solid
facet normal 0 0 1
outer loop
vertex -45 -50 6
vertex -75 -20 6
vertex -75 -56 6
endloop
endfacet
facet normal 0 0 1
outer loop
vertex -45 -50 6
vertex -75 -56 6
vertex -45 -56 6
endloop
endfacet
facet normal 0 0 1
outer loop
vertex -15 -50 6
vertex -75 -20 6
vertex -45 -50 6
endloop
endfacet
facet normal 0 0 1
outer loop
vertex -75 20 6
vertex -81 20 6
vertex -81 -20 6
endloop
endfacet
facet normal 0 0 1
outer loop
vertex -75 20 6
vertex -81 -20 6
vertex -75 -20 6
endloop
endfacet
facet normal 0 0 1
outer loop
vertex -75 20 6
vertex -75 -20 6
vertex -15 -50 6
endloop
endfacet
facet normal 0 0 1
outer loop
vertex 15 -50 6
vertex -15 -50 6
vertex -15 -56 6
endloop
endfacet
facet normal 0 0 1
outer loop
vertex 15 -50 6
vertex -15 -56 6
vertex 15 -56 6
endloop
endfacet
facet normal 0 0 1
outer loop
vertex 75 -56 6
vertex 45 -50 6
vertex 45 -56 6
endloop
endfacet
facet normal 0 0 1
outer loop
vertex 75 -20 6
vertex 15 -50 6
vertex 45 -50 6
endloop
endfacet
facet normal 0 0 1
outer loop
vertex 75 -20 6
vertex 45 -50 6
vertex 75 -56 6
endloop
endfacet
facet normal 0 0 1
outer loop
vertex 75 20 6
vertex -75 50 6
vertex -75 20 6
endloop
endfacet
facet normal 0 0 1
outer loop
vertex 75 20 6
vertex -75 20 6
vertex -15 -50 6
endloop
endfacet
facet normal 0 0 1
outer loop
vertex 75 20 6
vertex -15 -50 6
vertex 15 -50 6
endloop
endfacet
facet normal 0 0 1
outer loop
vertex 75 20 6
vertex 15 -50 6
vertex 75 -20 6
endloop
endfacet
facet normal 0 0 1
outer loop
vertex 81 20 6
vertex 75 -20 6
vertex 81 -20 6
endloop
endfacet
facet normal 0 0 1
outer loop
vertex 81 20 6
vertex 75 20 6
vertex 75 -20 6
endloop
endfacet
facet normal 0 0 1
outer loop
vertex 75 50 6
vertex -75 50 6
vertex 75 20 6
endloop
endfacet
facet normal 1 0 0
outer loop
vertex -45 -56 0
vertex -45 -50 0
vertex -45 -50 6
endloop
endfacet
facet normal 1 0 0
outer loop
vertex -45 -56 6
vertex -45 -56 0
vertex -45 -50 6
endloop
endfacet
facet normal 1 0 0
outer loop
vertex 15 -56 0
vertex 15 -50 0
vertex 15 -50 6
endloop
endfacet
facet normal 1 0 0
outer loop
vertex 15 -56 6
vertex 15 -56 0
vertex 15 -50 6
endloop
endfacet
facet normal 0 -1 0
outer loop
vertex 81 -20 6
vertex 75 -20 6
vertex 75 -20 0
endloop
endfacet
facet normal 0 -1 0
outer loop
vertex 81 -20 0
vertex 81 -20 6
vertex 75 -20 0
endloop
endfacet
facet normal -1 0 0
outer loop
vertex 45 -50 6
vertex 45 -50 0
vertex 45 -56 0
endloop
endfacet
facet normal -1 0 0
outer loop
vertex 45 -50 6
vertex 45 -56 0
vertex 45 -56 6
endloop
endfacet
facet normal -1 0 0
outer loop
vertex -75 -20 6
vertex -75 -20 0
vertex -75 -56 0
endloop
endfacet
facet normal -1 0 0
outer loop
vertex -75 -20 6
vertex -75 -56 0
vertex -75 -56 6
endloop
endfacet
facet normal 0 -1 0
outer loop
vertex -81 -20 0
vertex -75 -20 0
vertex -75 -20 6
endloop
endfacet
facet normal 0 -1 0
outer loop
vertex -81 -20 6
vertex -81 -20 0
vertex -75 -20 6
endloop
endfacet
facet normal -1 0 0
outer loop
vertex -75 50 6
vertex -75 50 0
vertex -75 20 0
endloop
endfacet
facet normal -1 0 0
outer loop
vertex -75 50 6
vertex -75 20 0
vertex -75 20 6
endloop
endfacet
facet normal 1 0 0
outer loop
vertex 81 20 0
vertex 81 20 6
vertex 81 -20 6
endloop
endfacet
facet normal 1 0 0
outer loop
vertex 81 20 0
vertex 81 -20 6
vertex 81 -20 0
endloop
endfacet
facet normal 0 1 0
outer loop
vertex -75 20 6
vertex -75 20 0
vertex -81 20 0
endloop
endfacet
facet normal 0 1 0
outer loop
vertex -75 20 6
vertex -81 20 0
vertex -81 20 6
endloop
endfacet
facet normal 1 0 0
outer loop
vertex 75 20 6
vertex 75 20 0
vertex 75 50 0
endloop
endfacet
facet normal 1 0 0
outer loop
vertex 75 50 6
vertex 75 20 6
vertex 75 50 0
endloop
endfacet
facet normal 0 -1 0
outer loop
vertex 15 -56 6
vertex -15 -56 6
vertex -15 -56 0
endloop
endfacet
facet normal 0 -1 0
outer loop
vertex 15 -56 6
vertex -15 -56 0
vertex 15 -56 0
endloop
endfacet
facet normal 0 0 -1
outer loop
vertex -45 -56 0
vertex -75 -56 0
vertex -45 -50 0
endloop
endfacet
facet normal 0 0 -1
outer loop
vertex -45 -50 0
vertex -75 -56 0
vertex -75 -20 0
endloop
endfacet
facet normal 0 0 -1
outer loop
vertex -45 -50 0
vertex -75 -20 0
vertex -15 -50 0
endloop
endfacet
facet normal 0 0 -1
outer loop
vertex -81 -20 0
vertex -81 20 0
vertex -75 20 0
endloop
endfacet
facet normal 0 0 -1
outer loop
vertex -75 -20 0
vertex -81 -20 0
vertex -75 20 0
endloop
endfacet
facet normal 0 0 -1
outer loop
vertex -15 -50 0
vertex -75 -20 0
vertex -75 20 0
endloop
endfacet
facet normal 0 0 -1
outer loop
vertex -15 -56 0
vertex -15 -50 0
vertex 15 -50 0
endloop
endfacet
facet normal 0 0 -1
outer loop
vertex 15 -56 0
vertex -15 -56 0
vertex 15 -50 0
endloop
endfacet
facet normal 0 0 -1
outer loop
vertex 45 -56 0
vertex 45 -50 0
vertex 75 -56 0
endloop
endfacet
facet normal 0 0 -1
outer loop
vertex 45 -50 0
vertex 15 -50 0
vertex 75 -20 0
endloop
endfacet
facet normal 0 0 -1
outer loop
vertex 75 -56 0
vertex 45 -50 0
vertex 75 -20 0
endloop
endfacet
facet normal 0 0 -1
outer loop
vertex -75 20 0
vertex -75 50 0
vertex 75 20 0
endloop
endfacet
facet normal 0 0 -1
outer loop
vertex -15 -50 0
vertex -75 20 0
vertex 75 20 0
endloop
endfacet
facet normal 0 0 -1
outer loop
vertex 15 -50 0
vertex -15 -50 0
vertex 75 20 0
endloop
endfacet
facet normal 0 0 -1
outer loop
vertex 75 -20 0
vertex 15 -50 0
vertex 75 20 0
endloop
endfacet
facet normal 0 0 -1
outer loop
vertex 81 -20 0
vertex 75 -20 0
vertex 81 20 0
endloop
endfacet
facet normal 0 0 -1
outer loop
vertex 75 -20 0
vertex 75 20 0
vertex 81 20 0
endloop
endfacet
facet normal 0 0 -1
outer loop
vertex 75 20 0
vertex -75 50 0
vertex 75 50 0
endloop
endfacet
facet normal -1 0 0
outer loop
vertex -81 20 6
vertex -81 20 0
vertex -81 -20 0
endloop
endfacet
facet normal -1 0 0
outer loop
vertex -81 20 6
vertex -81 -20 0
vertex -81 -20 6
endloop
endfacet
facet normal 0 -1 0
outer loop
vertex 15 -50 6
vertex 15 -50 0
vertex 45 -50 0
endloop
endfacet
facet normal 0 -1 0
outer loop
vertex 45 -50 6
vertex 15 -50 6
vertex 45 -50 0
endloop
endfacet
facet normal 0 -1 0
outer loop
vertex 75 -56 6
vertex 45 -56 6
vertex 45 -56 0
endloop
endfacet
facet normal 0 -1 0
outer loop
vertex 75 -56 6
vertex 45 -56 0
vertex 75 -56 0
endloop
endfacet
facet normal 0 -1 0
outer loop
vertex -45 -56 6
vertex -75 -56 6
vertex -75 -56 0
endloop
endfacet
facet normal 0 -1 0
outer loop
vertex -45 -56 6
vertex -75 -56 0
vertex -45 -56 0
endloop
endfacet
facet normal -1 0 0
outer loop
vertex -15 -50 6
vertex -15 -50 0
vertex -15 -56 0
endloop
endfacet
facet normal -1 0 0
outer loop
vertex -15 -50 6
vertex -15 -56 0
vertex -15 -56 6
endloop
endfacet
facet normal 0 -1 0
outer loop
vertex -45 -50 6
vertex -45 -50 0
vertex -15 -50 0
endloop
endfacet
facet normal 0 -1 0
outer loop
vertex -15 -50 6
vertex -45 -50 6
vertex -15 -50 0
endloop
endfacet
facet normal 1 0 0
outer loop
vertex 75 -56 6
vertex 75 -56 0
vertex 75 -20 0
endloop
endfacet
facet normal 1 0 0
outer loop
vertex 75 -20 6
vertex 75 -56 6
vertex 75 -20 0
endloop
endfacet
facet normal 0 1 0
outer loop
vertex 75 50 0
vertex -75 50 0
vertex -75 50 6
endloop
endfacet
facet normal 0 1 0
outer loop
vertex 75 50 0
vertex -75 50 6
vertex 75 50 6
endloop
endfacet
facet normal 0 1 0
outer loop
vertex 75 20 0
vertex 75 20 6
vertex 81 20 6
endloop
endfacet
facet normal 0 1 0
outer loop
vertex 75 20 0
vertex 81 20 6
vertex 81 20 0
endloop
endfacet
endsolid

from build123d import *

# Parameters (mm, degrees)
ESBO_O1_W                = 150
ESBO_O1_H                = 100
RESSALTO_EXTRUS_O3_DEPTH = 6
ESBO_O3_W                = 30
ESBO_O3_H                = 6
RESSALTO_EXTRUS_O5_DEPTH = 6
ESBO_O4_W                = 6
ESBO_O4_H                = 40
RESSALTO_EXTRUS_O6_DEPTH = 6
ESBO_O5_W                = 6
ESBO_O5_H                = 40
RESSALTO_EXTRUS_O7_DEPTH = 6


with BuildPart() as part:
    # Esboço1 → Ressalto-extrusão3 (new body)
    with BuildSketch(Plane.XY):
        Rectangle(ESBO_O1_W, ESBO_O1_H)
    extrude(amount=RESSALTO_EXTRUS_O3_DEPTH)

    # Esboço3 → Ressalto-extrusão5 (add)
    with BuildSketch(Plane.XZ.offset(50)):
        with Locations((-60, 3)):
            Rectangle(ESBO_O3_W, ESBO_O3_H)
        with Locations((0, 3)):
            Rectangle(ESBO_O3_W, ESBO_O3_H)
        with Locations((60, 3)):
            Rectangle(ESBO_O3_W, ESBO_O3_H)
    extrude(amount=RESSALTO_EXTRUS_O5_DEPTH)

    # Esboço4 → Ressalto-extrusão6 (add)
    with BuildSketch(Plane(origin=(75, 0, 0), x_dir=(0, 0, -1), z_dir=(1, 0, 0))):
        with Locations((-3, 0)):
            Rectangle(ESBO_O4_W, ESBO_O4_H)
    extrude(amount=RESSALTO_EXTRUS_O6_DEPTH)

    # Esboço5 → Ressalto-extrusão7 (add)
    with BuildSketch(Plane.ZY.offset(75)):
        with Locations((3, 0)):
            Rectangle(ESBO_O5_W, ESBO_O5_H)
    extrude(amount=RESSALTO_EXTRUS_O7_DEPTH)


solid = part.part
